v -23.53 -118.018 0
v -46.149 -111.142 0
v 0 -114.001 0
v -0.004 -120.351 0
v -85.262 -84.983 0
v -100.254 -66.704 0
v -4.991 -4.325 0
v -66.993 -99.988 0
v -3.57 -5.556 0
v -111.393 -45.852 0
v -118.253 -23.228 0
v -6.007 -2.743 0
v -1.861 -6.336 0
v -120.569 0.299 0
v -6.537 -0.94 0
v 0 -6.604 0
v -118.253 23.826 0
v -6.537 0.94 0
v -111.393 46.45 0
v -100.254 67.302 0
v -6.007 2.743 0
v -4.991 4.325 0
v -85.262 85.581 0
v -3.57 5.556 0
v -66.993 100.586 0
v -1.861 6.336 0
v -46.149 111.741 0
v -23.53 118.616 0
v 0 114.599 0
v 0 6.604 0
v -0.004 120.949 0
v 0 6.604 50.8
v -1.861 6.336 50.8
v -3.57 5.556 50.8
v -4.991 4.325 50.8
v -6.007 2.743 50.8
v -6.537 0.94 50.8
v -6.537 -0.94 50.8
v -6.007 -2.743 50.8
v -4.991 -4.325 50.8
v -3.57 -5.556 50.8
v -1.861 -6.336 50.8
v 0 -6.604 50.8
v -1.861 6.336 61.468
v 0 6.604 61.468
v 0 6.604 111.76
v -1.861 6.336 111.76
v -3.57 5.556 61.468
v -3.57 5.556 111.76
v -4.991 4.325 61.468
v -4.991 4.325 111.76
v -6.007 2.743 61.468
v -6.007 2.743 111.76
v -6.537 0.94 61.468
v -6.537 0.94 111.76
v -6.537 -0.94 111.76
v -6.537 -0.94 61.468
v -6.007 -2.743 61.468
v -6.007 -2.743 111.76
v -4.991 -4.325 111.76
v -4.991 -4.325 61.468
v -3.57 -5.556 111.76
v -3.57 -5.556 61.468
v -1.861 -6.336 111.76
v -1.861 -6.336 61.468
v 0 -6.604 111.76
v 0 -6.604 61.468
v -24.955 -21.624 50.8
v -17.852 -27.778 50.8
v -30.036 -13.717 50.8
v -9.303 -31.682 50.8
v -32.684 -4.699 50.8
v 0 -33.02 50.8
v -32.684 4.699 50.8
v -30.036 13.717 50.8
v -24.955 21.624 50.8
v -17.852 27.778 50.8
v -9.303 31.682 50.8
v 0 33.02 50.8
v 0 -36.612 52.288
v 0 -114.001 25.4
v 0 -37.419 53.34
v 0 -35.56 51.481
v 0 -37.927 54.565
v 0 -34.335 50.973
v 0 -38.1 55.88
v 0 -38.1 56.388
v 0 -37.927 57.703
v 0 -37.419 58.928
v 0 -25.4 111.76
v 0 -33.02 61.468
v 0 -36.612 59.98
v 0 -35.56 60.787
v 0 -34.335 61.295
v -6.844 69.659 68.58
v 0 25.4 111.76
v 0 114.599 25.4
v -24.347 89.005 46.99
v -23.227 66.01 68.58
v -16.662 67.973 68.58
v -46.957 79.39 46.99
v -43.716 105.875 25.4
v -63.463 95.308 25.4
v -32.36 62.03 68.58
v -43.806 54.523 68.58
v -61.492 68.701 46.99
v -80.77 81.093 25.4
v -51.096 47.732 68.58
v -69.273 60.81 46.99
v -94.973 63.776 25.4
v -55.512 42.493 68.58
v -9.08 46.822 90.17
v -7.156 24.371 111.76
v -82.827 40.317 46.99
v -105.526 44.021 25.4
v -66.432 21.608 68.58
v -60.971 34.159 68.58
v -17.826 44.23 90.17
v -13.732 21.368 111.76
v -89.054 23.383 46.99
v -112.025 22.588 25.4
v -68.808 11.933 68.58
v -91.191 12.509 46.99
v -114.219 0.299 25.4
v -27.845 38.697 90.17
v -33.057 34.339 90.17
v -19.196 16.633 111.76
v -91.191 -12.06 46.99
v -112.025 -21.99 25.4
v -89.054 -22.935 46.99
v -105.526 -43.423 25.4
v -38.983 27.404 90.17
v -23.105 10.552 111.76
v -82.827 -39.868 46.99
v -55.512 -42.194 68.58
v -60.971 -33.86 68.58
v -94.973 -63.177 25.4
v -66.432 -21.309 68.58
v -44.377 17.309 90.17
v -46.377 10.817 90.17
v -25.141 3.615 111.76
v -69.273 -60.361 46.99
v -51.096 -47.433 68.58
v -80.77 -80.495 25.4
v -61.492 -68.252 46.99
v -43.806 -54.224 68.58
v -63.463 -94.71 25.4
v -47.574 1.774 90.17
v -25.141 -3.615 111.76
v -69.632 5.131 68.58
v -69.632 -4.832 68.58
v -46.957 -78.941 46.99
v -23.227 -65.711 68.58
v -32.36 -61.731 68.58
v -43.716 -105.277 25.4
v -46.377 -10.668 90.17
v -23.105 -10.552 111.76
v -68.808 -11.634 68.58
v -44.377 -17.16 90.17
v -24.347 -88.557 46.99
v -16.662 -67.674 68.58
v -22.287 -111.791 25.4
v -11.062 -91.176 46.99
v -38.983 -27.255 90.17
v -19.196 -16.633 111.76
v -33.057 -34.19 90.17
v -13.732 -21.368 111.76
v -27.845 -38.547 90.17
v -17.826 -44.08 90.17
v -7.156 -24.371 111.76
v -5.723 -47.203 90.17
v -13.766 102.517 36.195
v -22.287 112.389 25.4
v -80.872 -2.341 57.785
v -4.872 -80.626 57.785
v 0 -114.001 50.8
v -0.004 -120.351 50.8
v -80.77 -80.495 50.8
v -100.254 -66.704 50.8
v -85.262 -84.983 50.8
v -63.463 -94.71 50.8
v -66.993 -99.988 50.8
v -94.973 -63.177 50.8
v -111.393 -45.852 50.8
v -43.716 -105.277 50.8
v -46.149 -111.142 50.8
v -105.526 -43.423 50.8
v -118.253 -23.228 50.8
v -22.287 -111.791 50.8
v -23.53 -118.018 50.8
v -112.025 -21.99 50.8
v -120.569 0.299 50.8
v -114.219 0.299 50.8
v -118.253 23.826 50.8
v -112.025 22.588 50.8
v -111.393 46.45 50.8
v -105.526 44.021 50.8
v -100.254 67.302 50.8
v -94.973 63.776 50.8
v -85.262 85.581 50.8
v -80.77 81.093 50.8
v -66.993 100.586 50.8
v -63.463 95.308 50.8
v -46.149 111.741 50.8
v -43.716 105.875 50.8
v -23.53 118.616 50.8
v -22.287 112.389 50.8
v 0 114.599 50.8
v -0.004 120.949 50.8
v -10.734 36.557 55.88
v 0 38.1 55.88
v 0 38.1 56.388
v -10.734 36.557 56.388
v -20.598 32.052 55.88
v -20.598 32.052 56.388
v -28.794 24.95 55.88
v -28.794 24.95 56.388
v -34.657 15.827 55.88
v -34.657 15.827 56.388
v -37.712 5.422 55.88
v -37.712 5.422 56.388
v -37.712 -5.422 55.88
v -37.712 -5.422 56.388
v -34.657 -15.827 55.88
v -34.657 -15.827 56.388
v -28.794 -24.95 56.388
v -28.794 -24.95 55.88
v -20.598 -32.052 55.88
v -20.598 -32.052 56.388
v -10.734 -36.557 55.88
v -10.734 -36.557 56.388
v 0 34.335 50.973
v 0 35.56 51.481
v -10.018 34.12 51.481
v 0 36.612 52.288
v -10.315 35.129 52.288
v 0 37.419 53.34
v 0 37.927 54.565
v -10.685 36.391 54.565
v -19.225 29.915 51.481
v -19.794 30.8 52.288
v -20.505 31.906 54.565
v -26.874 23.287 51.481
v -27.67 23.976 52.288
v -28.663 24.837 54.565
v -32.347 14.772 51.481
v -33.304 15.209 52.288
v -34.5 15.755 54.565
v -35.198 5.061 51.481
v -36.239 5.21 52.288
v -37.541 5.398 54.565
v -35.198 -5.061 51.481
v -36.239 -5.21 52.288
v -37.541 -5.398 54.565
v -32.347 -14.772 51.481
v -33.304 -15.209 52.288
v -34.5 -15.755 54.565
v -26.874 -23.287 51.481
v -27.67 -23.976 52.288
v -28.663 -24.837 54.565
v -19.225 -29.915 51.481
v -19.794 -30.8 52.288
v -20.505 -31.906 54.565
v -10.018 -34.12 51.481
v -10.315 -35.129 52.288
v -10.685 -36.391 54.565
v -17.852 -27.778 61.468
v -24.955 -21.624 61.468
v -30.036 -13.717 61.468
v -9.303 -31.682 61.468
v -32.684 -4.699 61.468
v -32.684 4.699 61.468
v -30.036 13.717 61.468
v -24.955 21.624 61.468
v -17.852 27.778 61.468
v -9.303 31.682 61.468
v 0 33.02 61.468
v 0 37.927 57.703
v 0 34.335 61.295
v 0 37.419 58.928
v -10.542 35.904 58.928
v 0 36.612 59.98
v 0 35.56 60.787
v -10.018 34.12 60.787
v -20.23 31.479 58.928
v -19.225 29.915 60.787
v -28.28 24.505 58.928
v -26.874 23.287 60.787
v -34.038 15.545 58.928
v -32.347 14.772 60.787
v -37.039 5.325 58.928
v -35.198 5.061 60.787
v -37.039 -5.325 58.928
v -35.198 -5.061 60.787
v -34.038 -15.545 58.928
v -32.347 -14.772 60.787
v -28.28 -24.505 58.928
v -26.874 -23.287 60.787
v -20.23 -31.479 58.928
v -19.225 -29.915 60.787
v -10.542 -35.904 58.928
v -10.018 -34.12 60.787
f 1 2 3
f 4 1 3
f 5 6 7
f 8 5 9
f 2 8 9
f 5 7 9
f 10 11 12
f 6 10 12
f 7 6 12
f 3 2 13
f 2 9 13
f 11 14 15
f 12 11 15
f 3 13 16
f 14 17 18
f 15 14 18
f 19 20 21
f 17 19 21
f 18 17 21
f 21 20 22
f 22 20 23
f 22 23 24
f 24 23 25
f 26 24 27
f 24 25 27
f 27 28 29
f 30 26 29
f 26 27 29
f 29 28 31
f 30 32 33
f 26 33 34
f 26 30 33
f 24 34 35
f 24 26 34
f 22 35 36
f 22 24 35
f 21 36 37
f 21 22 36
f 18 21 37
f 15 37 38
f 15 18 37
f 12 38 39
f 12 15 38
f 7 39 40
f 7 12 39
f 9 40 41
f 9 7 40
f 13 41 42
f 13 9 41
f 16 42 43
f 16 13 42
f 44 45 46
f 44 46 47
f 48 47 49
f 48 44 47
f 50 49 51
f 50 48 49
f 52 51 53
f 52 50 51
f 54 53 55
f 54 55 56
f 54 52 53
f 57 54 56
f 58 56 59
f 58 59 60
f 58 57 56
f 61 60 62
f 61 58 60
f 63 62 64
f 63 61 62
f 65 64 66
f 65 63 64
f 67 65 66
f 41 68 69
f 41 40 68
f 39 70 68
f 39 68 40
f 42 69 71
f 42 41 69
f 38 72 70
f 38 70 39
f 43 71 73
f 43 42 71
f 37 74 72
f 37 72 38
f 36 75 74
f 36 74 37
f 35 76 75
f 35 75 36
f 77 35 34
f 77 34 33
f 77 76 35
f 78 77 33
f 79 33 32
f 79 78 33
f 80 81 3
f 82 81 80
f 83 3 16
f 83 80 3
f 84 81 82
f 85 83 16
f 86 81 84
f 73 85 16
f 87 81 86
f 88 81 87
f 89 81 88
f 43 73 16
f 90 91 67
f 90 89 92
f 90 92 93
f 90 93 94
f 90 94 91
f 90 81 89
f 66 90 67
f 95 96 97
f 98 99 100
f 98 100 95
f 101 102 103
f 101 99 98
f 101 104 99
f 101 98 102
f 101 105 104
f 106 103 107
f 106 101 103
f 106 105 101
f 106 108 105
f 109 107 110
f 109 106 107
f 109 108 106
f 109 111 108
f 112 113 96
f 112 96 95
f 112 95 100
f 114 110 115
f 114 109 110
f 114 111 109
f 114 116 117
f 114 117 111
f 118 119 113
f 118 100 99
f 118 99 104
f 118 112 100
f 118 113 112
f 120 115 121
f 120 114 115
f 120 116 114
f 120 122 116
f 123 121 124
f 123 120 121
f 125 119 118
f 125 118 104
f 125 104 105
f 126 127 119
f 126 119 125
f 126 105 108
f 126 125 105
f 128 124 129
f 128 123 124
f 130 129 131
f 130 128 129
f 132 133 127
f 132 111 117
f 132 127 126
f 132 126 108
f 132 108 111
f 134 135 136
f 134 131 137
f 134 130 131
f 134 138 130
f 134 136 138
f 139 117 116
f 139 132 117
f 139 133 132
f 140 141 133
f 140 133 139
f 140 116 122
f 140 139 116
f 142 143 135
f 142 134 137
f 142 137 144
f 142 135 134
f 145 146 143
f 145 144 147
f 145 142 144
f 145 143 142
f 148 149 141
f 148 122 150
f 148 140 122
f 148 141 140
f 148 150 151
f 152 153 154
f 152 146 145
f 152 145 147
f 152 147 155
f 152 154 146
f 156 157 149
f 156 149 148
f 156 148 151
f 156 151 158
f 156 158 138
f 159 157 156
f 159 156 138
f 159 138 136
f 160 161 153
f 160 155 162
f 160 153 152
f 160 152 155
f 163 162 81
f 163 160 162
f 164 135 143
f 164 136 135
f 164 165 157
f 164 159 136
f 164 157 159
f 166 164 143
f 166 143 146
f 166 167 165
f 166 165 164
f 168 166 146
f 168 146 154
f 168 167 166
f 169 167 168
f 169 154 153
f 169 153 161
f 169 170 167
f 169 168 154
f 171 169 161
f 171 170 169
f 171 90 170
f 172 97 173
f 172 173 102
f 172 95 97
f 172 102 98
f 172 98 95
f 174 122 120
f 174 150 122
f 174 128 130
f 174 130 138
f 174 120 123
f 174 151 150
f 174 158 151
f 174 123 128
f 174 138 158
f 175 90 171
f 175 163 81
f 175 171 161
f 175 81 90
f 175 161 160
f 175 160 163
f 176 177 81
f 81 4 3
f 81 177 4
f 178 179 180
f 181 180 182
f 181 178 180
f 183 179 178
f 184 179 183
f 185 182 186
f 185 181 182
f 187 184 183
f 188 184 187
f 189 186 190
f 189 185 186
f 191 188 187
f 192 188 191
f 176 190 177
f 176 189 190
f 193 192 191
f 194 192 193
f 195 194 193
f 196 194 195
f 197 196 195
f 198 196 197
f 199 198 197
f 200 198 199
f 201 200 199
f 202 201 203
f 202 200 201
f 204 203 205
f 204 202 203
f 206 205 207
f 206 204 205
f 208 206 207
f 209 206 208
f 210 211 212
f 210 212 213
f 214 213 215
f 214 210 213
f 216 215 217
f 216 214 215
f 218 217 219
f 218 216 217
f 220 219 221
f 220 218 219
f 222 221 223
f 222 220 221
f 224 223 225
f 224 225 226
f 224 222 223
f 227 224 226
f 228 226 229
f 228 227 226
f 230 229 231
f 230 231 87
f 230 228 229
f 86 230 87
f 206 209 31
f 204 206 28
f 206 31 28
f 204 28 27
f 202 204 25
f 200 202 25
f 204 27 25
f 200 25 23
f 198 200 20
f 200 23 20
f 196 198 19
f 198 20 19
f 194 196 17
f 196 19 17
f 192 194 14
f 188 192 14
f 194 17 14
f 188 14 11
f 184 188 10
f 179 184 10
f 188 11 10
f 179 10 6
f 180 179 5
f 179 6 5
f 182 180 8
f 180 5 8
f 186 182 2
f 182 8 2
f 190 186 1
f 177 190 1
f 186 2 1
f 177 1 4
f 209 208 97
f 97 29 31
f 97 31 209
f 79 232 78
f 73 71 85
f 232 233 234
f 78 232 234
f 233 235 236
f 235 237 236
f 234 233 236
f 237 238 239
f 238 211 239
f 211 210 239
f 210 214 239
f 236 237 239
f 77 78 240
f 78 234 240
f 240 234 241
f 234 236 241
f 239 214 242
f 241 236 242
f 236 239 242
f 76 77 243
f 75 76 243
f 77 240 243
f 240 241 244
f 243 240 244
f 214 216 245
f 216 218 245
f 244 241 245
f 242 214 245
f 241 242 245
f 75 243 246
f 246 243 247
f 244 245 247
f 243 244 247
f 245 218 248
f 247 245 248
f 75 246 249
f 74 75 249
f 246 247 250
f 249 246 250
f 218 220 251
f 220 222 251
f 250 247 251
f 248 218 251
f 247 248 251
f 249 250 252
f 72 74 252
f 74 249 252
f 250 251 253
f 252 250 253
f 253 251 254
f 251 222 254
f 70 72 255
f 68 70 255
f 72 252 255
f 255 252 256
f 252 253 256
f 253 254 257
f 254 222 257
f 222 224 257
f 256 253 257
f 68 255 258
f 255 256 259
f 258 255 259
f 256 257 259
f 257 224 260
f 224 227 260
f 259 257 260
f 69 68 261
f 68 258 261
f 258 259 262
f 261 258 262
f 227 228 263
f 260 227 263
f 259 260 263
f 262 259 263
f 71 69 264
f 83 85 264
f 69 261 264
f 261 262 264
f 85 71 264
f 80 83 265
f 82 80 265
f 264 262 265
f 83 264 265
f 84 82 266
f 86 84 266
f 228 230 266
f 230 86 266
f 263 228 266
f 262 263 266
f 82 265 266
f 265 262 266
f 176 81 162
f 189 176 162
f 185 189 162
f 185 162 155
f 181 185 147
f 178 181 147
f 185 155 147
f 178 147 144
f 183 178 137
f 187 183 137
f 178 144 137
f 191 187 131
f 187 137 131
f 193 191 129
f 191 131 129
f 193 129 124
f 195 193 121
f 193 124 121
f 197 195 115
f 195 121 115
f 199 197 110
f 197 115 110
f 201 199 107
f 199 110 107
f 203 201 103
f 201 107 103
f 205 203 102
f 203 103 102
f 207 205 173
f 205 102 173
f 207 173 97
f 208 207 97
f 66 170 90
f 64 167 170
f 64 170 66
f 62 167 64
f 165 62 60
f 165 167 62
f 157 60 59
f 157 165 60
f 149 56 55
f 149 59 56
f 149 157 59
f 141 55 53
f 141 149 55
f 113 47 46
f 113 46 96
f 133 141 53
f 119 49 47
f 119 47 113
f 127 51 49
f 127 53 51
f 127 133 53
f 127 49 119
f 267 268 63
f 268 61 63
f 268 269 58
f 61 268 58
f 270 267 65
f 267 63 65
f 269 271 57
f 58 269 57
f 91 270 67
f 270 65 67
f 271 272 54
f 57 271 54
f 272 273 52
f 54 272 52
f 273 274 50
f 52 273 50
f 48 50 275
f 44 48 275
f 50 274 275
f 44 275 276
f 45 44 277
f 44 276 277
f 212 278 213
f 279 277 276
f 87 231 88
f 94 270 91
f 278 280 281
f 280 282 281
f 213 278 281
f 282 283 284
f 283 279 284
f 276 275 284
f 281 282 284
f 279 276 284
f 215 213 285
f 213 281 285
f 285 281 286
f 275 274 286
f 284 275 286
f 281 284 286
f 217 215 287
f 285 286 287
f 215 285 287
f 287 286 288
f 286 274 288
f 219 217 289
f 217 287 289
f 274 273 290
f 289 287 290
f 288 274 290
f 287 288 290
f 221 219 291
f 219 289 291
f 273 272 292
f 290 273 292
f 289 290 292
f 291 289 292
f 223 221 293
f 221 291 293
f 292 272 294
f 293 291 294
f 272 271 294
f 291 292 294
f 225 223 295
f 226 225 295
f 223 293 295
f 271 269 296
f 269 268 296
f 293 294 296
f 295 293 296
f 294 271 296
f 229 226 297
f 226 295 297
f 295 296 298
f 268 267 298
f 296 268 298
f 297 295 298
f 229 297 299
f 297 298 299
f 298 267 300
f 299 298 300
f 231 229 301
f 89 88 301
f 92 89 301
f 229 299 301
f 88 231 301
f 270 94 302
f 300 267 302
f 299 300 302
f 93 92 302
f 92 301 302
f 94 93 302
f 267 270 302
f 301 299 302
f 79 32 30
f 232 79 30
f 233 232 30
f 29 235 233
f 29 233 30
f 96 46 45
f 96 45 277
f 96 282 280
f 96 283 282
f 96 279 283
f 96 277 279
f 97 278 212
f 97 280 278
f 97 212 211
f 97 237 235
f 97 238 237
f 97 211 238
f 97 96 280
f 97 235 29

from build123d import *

# Parameters (mm, degrees)
F1_DEPTH  = 25.4
F2_DEPTH  = 50.8
F9_R      = 6.604
F10_DEPTH = 111.76
F11_R     = 38.1
F12_DEPTH = 10.668
F13_R     = 5.08


with BuildPart() as f1:
    # F0 (on Top) → F1 (new body)
    with BuildSketch(Plane.XY):
        with BuildLine():
            Line((0, -114.0008171796), (0, 114.599125499))
            ThreePointArc((0, 114.599125499), (-114.2190565937, 0.2991541597), (0, -114.0008171796))
        make_face()
    extrude(amount=F1_DEPTH)

    # F0 (on Top) → F2 (join)
    with BuildSketch(Plane.XY):
        with BuildLine():
            ThreePointArc((0, -114.0008171796), (-114.2190565937, 0.2991541597), (0, 114.599125499))
            Line((0, 114.599125499), (-0.0044968559, 120.9491239067))
            ThreePointArc((-0.0044968559, 120.9491239067), (-120.5690565937, 0.2991541597), (-0.0044968559, -120.3508155874))
            Line((-0.0044968559, -120.3508155874), (0, -114.0008171796))
        make_face()
    extrude(amount=F2_DEPTH)

    # F1_face (on face) → F5 section 0
    with BuildSketch(Plane(origin=(-48.4732263634, 0.2991541597, 25.4), x_dir=(1, 0, 0), z_dir=(0, 0, 1))):
        with BuildLine():
            Line((48.4732263634, -114.2999713393), (48.4732263634, 114.2999713393))
            ThreePointArc((48.4732263634, 114.2999713393), (-65.7458302303, 0), (48.4732263634, -114.2999713393))
        make_face()
    # F4 (on offset) → F5 section 1
    with BuildSketch(Plane.XY.offset(111.76)):
        with BuildLine():
            Line((0, 0), (0, 25.4))
            ThreePointArc((0, 25.4), (-25.4, 0), (0, -25.4))
            Line((0, -25.4), (0, 0))
        make_face()
    loft()

    # F9 (on Top) → F10 (cut)
    with BuildSketch(Plane.XY):
        Circle(F9_R)
    extrude(amount=F10_DEPTH, mode=Mode.SUBTRACT)

    # F11 (on offset) → F12 (cut)
    with BuildSketch(Plane.XY.offset(50.8)):
        Circle(F11_R)
    extrude(amount=F12_DEPTH, mode=Mode.SUBTRACT)

    # F13
    f13_edges = [f1.edges().sort_by_distance(p)[0] for p in [
        (-38.1, 0, 61.468),
        (-38.1, 0, 50.8),
    ]]
    fillet(f13_edges, radius=F13_R)


solid = f1.part
